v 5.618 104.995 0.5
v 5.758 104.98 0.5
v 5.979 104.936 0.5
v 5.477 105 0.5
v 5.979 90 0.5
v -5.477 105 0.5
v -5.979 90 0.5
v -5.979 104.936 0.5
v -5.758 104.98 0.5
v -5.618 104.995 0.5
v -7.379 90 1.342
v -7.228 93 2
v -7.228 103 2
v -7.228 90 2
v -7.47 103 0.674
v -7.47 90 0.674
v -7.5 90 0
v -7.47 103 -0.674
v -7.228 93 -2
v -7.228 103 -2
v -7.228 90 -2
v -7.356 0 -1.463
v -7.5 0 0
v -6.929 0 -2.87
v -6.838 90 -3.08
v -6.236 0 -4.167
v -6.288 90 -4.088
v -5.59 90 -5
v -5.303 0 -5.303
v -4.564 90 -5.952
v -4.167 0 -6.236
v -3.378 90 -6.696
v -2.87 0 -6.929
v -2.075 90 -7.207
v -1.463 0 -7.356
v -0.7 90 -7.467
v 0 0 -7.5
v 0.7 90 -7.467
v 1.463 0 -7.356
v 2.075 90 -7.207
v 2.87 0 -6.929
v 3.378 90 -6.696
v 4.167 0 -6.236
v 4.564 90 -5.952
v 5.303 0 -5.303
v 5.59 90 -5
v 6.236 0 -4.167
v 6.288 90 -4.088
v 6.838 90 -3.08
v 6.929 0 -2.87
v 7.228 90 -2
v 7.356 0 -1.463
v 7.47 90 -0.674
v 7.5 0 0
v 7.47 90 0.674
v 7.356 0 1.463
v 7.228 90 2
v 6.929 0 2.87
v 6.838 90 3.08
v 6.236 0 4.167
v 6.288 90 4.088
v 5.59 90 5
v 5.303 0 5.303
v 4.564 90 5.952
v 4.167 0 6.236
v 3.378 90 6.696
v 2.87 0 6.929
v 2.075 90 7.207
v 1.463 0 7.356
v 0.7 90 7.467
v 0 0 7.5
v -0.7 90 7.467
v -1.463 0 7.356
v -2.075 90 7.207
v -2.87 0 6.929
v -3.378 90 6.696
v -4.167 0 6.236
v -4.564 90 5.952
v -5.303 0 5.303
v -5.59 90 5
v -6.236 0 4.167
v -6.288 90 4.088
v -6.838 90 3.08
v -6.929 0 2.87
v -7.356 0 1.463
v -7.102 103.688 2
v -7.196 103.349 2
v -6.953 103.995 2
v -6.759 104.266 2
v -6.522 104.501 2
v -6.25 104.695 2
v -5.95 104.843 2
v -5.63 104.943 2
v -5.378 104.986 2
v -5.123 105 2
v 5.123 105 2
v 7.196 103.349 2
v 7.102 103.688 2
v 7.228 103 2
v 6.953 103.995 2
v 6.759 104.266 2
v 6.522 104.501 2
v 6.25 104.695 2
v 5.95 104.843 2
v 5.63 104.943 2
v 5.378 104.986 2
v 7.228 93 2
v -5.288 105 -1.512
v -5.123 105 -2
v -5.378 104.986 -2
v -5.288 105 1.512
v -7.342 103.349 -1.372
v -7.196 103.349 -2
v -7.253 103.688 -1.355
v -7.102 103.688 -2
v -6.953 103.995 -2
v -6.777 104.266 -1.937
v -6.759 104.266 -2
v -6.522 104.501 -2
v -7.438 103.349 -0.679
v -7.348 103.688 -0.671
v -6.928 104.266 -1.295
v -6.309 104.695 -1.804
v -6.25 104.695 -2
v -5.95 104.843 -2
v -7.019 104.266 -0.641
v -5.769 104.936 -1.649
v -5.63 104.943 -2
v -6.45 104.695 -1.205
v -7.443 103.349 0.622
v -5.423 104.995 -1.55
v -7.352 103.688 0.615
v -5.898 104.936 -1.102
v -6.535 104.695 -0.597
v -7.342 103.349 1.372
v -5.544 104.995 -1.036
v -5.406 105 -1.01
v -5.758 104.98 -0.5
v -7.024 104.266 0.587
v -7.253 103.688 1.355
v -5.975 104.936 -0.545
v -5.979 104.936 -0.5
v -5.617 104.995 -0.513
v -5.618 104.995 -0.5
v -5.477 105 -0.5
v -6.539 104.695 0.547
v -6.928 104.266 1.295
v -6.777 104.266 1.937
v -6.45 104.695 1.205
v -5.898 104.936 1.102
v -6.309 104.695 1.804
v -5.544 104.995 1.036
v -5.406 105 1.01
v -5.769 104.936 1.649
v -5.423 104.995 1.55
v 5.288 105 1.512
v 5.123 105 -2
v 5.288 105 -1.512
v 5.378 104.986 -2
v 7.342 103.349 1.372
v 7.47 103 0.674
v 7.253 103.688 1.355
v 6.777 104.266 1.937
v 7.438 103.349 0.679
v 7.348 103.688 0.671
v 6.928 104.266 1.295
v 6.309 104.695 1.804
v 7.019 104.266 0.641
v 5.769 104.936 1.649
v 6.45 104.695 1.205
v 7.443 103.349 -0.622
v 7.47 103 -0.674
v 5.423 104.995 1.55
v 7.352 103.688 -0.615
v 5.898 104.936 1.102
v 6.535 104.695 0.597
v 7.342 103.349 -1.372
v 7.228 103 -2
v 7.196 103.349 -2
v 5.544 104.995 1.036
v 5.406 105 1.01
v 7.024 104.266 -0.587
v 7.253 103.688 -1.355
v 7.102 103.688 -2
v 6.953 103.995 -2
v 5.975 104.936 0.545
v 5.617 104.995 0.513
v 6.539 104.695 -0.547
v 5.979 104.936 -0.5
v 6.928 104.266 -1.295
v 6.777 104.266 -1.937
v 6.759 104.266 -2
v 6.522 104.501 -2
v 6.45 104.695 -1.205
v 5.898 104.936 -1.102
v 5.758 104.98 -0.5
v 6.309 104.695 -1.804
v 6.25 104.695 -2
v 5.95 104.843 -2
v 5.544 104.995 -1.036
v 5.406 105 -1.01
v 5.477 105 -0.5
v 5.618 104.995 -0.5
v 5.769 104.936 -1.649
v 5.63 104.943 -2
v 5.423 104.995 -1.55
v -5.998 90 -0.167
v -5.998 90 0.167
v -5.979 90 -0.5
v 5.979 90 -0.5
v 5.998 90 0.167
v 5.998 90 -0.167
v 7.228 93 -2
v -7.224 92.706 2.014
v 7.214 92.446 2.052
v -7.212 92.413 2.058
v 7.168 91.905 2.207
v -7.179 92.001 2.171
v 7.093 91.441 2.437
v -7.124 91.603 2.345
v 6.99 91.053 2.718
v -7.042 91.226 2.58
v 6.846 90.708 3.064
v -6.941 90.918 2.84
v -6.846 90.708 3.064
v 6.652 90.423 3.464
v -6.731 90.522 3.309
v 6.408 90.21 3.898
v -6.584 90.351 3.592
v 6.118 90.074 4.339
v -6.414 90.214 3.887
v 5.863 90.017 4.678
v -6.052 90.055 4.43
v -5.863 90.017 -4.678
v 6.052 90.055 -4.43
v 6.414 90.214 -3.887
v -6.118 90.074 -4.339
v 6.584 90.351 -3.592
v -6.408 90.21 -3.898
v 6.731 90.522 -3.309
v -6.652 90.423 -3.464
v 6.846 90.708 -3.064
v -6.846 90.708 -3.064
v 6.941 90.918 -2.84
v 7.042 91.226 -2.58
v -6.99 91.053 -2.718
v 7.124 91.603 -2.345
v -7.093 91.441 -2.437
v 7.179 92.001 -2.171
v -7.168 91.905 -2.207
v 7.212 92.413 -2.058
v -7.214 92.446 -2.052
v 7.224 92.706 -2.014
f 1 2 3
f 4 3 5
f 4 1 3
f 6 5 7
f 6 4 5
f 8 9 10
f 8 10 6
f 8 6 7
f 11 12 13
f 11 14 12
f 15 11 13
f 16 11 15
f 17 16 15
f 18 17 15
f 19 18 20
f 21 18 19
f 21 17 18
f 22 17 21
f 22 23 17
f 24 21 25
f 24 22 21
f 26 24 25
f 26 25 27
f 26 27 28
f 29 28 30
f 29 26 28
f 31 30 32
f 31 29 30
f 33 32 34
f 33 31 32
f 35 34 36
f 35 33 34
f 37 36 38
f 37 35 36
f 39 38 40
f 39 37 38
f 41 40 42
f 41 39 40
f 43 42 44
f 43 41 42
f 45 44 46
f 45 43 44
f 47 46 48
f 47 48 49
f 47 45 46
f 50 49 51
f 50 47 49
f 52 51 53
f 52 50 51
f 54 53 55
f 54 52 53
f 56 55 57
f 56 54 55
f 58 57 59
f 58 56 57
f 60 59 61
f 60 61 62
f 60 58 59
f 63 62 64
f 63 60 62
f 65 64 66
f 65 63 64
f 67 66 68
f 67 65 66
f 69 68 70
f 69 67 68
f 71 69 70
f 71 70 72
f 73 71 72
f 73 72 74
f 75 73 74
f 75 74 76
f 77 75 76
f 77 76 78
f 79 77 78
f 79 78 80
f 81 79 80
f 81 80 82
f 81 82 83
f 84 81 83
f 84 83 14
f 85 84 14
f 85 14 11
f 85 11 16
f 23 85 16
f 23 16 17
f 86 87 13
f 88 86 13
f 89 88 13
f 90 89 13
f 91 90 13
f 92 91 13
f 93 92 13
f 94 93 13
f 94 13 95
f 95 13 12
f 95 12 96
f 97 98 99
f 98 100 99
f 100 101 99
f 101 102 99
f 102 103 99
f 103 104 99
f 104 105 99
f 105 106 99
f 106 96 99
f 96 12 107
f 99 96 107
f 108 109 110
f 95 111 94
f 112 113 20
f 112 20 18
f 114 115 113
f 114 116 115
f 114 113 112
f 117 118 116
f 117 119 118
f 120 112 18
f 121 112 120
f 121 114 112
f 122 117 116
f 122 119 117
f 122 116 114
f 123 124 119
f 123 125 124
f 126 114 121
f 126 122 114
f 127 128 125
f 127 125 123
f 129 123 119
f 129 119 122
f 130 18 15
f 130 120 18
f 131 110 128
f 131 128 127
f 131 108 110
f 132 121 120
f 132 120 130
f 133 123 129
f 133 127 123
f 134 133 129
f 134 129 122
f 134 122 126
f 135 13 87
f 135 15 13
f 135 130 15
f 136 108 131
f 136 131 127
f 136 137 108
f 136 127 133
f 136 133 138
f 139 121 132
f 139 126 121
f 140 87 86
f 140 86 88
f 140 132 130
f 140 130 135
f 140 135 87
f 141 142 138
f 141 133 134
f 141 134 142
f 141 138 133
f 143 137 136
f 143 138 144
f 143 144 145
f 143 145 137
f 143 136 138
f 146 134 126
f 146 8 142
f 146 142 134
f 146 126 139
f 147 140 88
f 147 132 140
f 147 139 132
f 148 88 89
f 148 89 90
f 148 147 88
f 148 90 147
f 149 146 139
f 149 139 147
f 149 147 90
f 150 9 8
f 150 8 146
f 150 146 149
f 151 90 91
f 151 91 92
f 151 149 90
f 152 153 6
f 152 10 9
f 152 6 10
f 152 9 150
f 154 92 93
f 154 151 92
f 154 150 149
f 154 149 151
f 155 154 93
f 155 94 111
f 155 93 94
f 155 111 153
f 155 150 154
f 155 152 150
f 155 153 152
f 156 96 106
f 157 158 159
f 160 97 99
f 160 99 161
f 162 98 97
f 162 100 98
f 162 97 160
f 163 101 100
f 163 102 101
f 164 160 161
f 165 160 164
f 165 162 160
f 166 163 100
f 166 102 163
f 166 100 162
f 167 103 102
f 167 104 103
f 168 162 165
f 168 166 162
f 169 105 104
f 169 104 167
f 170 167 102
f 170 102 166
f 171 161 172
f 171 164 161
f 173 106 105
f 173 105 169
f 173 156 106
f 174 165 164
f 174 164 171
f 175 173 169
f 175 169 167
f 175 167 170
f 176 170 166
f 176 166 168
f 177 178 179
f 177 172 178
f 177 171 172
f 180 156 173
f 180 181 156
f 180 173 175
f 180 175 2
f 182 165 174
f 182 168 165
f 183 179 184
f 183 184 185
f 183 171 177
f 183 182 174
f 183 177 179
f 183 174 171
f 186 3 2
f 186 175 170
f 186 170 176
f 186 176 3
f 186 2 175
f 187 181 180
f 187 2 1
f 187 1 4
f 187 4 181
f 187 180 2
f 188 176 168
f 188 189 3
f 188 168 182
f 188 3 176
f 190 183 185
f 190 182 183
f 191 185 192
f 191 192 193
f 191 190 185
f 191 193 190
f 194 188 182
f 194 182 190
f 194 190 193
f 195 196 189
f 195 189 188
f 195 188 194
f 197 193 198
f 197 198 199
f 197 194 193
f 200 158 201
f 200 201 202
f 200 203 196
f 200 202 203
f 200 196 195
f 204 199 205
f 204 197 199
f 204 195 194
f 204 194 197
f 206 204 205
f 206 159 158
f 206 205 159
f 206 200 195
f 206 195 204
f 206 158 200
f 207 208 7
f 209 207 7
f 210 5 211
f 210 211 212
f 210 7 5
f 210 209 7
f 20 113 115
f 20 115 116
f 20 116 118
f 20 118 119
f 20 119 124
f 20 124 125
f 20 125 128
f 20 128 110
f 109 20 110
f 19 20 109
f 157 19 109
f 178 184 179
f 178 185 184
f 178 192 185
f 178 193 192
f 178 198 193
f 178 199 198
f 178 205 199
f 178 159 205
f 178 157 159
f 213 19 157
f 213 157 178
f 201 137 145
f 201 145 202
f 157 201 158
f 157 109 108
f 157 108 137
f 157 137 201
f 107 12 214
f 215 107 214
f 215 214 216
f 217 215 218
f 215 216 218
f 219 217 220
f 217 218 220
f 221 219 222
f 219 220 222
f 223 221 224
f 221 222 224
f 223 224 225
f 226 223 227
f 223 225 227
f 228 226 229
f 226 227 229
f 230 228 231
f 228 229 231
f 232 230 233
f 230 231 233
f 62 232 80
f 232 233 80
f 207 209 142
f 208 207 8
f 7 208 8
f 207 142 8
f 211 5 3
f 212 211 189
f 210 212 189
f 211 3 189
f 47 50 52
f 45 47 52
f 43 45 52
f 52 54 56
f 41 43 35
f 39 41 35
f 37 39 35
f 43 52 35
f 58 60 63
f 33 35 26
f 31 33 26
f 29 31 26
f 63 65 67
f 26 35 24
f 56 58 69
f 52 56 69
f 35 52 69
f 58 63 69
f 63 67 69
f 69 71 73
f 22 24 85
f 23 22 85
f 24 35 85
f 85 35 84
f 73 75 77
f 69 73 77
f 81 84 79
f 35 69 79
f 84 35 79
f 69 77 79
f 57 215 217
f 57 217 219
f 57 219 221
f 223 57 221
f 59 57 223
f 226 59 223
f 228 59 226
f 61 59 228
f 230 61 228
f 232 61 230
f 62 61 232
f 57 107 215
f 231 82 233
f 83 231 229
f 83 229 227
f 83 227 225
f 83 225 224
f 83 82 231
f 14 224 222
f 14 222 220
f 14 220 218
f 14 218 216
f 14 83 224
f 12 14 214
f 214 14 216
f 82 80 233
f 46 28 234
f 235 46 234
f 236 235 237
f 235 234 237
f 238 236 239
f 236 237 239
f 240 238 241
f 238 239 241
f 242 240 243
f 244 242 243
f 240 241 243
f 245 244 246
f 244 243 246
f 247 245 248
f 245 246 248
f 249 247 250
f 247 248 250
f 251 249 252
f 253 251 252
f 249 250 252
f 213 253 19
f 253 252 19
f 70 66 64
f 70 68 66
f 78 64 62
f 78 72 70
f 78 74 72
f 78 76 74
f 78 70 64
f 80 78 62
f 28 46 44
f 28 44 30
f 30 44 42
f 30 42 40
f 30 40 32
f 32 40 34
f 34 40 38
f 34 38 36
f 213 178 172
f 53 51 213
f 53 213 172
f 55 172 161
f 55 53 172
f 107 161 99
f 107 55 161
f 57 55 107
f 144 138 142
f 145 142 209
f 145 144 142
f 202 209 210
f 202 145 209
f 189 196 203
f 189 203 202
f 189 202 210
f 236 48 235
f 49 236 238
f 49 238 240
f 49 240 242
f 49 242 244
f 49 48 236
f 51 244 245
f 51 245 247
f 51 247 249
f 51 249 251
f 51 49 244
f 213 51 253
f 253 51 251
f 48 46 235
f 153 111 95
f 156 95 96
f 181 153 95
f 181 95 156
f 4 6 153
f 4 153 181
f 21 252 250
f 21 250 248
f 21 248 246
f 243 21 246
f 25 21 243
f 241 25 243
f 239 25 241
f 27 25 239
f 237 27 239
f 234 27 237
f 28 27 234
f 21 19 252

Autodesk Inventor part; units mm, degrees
ref_plane "YZ Plane" through (0, 0, 0) normal (1, 0, 0) x (0, 1, 0)
ref_plane "XZ Plane" through (0, 0, 0) normal (0, 1, 0) x (-1, 0, 0)
ref_plane "XY Plane" through (0, 0, 0) normal (0, 0, 1) x (1, 0, 0)
sketch "Sketch1" plane through (0, 0, 0) normal (0, 1, 0) x (-1, 0, 0)
  line L0 (0, -10.5) -> (0, 10.5) projected
  line L1 (-10.5, 0) -> (10.5, 0) projected
  circle A0 centre (0, 0) radius 7.5
  dimension "d0" = 15
extrude "Extrusion1" add sketch "Sketch1" along normal blind 90
sketch "Sketch2" plane through (0, 90, 0) normal (0, 1, 0) x (1, 0, 0)
  line L0 (10.5, 0) -> (-10.5, 0) projected
  line L1 (0, 10.5) -> (0, -10.5) projected
  line L2 (-7.2284, 2) -> (7.2284, 2)
  line L3 (-7.2284, -2) -> (7.2284, -2)
  circle A0 centre (0, 0) radius 7.5 projected
  arc A1 (7.2284, -2) -> (7.2284, 2) centre (0, 0) ccw
  arc A2 (-7.2284, 2) -> (-7.2284, -2) centre (0, 0) ccw
  point P0 (7.2284, -2)
  dimension "d3" = 4
  dimension "d4" = 15
  dimension "d5" = 4
extrude "Extrusion2" add sketch "Sketch2" along normal blind 15 contours A0 L3 L1 L0 | L0 L1 L2 A0 | L1 L3 A0 L0 | L0 A0 L2 L1
fillet "Fillet1" radius 3 2 edges at (0, 90, 2) (0, 90, -2)
sketch "Sketch3" plane through (0, 105, 0) normal (0, 1, 0) x (1, 0, 0)
  line L0 (-7.2284, -2) -> (7.2284, -2) projected
  line L1 (7.2284, 2) -> (-7.2284, 2) projected
  arc A0 (7.2284, -2) -> (7.2284, 2) centre (0, 0) ccw projected
  arc A1 (-7.2284, 2) -> (-7.2284, -2) centre (0, 0) ccw projected
  line L2 (-5.9791, 0.5) -> (5.9791, 0.5)
  arc A2 (5.9791, -0.5) -> (5.9791, 0.5) centre (0, 0) ccw
  line L3 (5.9791, -0.5) -> (-5.9791, -0.5)
  arc A3 (-5.9791, 0.5) -> (-5.9791, -0.5) centre (0, 0) ccw
  dimension "d9" = 1.5
extrude "Extrusion3" cut sketch "Sketch3" against normal blind 15 contours L2 A2 L3 A3
fillet "Fillet2" radius 2 2 edges at (7.5, 105, 0) (-7.5, 105, 0)
properties part number "PUFIK_2"
